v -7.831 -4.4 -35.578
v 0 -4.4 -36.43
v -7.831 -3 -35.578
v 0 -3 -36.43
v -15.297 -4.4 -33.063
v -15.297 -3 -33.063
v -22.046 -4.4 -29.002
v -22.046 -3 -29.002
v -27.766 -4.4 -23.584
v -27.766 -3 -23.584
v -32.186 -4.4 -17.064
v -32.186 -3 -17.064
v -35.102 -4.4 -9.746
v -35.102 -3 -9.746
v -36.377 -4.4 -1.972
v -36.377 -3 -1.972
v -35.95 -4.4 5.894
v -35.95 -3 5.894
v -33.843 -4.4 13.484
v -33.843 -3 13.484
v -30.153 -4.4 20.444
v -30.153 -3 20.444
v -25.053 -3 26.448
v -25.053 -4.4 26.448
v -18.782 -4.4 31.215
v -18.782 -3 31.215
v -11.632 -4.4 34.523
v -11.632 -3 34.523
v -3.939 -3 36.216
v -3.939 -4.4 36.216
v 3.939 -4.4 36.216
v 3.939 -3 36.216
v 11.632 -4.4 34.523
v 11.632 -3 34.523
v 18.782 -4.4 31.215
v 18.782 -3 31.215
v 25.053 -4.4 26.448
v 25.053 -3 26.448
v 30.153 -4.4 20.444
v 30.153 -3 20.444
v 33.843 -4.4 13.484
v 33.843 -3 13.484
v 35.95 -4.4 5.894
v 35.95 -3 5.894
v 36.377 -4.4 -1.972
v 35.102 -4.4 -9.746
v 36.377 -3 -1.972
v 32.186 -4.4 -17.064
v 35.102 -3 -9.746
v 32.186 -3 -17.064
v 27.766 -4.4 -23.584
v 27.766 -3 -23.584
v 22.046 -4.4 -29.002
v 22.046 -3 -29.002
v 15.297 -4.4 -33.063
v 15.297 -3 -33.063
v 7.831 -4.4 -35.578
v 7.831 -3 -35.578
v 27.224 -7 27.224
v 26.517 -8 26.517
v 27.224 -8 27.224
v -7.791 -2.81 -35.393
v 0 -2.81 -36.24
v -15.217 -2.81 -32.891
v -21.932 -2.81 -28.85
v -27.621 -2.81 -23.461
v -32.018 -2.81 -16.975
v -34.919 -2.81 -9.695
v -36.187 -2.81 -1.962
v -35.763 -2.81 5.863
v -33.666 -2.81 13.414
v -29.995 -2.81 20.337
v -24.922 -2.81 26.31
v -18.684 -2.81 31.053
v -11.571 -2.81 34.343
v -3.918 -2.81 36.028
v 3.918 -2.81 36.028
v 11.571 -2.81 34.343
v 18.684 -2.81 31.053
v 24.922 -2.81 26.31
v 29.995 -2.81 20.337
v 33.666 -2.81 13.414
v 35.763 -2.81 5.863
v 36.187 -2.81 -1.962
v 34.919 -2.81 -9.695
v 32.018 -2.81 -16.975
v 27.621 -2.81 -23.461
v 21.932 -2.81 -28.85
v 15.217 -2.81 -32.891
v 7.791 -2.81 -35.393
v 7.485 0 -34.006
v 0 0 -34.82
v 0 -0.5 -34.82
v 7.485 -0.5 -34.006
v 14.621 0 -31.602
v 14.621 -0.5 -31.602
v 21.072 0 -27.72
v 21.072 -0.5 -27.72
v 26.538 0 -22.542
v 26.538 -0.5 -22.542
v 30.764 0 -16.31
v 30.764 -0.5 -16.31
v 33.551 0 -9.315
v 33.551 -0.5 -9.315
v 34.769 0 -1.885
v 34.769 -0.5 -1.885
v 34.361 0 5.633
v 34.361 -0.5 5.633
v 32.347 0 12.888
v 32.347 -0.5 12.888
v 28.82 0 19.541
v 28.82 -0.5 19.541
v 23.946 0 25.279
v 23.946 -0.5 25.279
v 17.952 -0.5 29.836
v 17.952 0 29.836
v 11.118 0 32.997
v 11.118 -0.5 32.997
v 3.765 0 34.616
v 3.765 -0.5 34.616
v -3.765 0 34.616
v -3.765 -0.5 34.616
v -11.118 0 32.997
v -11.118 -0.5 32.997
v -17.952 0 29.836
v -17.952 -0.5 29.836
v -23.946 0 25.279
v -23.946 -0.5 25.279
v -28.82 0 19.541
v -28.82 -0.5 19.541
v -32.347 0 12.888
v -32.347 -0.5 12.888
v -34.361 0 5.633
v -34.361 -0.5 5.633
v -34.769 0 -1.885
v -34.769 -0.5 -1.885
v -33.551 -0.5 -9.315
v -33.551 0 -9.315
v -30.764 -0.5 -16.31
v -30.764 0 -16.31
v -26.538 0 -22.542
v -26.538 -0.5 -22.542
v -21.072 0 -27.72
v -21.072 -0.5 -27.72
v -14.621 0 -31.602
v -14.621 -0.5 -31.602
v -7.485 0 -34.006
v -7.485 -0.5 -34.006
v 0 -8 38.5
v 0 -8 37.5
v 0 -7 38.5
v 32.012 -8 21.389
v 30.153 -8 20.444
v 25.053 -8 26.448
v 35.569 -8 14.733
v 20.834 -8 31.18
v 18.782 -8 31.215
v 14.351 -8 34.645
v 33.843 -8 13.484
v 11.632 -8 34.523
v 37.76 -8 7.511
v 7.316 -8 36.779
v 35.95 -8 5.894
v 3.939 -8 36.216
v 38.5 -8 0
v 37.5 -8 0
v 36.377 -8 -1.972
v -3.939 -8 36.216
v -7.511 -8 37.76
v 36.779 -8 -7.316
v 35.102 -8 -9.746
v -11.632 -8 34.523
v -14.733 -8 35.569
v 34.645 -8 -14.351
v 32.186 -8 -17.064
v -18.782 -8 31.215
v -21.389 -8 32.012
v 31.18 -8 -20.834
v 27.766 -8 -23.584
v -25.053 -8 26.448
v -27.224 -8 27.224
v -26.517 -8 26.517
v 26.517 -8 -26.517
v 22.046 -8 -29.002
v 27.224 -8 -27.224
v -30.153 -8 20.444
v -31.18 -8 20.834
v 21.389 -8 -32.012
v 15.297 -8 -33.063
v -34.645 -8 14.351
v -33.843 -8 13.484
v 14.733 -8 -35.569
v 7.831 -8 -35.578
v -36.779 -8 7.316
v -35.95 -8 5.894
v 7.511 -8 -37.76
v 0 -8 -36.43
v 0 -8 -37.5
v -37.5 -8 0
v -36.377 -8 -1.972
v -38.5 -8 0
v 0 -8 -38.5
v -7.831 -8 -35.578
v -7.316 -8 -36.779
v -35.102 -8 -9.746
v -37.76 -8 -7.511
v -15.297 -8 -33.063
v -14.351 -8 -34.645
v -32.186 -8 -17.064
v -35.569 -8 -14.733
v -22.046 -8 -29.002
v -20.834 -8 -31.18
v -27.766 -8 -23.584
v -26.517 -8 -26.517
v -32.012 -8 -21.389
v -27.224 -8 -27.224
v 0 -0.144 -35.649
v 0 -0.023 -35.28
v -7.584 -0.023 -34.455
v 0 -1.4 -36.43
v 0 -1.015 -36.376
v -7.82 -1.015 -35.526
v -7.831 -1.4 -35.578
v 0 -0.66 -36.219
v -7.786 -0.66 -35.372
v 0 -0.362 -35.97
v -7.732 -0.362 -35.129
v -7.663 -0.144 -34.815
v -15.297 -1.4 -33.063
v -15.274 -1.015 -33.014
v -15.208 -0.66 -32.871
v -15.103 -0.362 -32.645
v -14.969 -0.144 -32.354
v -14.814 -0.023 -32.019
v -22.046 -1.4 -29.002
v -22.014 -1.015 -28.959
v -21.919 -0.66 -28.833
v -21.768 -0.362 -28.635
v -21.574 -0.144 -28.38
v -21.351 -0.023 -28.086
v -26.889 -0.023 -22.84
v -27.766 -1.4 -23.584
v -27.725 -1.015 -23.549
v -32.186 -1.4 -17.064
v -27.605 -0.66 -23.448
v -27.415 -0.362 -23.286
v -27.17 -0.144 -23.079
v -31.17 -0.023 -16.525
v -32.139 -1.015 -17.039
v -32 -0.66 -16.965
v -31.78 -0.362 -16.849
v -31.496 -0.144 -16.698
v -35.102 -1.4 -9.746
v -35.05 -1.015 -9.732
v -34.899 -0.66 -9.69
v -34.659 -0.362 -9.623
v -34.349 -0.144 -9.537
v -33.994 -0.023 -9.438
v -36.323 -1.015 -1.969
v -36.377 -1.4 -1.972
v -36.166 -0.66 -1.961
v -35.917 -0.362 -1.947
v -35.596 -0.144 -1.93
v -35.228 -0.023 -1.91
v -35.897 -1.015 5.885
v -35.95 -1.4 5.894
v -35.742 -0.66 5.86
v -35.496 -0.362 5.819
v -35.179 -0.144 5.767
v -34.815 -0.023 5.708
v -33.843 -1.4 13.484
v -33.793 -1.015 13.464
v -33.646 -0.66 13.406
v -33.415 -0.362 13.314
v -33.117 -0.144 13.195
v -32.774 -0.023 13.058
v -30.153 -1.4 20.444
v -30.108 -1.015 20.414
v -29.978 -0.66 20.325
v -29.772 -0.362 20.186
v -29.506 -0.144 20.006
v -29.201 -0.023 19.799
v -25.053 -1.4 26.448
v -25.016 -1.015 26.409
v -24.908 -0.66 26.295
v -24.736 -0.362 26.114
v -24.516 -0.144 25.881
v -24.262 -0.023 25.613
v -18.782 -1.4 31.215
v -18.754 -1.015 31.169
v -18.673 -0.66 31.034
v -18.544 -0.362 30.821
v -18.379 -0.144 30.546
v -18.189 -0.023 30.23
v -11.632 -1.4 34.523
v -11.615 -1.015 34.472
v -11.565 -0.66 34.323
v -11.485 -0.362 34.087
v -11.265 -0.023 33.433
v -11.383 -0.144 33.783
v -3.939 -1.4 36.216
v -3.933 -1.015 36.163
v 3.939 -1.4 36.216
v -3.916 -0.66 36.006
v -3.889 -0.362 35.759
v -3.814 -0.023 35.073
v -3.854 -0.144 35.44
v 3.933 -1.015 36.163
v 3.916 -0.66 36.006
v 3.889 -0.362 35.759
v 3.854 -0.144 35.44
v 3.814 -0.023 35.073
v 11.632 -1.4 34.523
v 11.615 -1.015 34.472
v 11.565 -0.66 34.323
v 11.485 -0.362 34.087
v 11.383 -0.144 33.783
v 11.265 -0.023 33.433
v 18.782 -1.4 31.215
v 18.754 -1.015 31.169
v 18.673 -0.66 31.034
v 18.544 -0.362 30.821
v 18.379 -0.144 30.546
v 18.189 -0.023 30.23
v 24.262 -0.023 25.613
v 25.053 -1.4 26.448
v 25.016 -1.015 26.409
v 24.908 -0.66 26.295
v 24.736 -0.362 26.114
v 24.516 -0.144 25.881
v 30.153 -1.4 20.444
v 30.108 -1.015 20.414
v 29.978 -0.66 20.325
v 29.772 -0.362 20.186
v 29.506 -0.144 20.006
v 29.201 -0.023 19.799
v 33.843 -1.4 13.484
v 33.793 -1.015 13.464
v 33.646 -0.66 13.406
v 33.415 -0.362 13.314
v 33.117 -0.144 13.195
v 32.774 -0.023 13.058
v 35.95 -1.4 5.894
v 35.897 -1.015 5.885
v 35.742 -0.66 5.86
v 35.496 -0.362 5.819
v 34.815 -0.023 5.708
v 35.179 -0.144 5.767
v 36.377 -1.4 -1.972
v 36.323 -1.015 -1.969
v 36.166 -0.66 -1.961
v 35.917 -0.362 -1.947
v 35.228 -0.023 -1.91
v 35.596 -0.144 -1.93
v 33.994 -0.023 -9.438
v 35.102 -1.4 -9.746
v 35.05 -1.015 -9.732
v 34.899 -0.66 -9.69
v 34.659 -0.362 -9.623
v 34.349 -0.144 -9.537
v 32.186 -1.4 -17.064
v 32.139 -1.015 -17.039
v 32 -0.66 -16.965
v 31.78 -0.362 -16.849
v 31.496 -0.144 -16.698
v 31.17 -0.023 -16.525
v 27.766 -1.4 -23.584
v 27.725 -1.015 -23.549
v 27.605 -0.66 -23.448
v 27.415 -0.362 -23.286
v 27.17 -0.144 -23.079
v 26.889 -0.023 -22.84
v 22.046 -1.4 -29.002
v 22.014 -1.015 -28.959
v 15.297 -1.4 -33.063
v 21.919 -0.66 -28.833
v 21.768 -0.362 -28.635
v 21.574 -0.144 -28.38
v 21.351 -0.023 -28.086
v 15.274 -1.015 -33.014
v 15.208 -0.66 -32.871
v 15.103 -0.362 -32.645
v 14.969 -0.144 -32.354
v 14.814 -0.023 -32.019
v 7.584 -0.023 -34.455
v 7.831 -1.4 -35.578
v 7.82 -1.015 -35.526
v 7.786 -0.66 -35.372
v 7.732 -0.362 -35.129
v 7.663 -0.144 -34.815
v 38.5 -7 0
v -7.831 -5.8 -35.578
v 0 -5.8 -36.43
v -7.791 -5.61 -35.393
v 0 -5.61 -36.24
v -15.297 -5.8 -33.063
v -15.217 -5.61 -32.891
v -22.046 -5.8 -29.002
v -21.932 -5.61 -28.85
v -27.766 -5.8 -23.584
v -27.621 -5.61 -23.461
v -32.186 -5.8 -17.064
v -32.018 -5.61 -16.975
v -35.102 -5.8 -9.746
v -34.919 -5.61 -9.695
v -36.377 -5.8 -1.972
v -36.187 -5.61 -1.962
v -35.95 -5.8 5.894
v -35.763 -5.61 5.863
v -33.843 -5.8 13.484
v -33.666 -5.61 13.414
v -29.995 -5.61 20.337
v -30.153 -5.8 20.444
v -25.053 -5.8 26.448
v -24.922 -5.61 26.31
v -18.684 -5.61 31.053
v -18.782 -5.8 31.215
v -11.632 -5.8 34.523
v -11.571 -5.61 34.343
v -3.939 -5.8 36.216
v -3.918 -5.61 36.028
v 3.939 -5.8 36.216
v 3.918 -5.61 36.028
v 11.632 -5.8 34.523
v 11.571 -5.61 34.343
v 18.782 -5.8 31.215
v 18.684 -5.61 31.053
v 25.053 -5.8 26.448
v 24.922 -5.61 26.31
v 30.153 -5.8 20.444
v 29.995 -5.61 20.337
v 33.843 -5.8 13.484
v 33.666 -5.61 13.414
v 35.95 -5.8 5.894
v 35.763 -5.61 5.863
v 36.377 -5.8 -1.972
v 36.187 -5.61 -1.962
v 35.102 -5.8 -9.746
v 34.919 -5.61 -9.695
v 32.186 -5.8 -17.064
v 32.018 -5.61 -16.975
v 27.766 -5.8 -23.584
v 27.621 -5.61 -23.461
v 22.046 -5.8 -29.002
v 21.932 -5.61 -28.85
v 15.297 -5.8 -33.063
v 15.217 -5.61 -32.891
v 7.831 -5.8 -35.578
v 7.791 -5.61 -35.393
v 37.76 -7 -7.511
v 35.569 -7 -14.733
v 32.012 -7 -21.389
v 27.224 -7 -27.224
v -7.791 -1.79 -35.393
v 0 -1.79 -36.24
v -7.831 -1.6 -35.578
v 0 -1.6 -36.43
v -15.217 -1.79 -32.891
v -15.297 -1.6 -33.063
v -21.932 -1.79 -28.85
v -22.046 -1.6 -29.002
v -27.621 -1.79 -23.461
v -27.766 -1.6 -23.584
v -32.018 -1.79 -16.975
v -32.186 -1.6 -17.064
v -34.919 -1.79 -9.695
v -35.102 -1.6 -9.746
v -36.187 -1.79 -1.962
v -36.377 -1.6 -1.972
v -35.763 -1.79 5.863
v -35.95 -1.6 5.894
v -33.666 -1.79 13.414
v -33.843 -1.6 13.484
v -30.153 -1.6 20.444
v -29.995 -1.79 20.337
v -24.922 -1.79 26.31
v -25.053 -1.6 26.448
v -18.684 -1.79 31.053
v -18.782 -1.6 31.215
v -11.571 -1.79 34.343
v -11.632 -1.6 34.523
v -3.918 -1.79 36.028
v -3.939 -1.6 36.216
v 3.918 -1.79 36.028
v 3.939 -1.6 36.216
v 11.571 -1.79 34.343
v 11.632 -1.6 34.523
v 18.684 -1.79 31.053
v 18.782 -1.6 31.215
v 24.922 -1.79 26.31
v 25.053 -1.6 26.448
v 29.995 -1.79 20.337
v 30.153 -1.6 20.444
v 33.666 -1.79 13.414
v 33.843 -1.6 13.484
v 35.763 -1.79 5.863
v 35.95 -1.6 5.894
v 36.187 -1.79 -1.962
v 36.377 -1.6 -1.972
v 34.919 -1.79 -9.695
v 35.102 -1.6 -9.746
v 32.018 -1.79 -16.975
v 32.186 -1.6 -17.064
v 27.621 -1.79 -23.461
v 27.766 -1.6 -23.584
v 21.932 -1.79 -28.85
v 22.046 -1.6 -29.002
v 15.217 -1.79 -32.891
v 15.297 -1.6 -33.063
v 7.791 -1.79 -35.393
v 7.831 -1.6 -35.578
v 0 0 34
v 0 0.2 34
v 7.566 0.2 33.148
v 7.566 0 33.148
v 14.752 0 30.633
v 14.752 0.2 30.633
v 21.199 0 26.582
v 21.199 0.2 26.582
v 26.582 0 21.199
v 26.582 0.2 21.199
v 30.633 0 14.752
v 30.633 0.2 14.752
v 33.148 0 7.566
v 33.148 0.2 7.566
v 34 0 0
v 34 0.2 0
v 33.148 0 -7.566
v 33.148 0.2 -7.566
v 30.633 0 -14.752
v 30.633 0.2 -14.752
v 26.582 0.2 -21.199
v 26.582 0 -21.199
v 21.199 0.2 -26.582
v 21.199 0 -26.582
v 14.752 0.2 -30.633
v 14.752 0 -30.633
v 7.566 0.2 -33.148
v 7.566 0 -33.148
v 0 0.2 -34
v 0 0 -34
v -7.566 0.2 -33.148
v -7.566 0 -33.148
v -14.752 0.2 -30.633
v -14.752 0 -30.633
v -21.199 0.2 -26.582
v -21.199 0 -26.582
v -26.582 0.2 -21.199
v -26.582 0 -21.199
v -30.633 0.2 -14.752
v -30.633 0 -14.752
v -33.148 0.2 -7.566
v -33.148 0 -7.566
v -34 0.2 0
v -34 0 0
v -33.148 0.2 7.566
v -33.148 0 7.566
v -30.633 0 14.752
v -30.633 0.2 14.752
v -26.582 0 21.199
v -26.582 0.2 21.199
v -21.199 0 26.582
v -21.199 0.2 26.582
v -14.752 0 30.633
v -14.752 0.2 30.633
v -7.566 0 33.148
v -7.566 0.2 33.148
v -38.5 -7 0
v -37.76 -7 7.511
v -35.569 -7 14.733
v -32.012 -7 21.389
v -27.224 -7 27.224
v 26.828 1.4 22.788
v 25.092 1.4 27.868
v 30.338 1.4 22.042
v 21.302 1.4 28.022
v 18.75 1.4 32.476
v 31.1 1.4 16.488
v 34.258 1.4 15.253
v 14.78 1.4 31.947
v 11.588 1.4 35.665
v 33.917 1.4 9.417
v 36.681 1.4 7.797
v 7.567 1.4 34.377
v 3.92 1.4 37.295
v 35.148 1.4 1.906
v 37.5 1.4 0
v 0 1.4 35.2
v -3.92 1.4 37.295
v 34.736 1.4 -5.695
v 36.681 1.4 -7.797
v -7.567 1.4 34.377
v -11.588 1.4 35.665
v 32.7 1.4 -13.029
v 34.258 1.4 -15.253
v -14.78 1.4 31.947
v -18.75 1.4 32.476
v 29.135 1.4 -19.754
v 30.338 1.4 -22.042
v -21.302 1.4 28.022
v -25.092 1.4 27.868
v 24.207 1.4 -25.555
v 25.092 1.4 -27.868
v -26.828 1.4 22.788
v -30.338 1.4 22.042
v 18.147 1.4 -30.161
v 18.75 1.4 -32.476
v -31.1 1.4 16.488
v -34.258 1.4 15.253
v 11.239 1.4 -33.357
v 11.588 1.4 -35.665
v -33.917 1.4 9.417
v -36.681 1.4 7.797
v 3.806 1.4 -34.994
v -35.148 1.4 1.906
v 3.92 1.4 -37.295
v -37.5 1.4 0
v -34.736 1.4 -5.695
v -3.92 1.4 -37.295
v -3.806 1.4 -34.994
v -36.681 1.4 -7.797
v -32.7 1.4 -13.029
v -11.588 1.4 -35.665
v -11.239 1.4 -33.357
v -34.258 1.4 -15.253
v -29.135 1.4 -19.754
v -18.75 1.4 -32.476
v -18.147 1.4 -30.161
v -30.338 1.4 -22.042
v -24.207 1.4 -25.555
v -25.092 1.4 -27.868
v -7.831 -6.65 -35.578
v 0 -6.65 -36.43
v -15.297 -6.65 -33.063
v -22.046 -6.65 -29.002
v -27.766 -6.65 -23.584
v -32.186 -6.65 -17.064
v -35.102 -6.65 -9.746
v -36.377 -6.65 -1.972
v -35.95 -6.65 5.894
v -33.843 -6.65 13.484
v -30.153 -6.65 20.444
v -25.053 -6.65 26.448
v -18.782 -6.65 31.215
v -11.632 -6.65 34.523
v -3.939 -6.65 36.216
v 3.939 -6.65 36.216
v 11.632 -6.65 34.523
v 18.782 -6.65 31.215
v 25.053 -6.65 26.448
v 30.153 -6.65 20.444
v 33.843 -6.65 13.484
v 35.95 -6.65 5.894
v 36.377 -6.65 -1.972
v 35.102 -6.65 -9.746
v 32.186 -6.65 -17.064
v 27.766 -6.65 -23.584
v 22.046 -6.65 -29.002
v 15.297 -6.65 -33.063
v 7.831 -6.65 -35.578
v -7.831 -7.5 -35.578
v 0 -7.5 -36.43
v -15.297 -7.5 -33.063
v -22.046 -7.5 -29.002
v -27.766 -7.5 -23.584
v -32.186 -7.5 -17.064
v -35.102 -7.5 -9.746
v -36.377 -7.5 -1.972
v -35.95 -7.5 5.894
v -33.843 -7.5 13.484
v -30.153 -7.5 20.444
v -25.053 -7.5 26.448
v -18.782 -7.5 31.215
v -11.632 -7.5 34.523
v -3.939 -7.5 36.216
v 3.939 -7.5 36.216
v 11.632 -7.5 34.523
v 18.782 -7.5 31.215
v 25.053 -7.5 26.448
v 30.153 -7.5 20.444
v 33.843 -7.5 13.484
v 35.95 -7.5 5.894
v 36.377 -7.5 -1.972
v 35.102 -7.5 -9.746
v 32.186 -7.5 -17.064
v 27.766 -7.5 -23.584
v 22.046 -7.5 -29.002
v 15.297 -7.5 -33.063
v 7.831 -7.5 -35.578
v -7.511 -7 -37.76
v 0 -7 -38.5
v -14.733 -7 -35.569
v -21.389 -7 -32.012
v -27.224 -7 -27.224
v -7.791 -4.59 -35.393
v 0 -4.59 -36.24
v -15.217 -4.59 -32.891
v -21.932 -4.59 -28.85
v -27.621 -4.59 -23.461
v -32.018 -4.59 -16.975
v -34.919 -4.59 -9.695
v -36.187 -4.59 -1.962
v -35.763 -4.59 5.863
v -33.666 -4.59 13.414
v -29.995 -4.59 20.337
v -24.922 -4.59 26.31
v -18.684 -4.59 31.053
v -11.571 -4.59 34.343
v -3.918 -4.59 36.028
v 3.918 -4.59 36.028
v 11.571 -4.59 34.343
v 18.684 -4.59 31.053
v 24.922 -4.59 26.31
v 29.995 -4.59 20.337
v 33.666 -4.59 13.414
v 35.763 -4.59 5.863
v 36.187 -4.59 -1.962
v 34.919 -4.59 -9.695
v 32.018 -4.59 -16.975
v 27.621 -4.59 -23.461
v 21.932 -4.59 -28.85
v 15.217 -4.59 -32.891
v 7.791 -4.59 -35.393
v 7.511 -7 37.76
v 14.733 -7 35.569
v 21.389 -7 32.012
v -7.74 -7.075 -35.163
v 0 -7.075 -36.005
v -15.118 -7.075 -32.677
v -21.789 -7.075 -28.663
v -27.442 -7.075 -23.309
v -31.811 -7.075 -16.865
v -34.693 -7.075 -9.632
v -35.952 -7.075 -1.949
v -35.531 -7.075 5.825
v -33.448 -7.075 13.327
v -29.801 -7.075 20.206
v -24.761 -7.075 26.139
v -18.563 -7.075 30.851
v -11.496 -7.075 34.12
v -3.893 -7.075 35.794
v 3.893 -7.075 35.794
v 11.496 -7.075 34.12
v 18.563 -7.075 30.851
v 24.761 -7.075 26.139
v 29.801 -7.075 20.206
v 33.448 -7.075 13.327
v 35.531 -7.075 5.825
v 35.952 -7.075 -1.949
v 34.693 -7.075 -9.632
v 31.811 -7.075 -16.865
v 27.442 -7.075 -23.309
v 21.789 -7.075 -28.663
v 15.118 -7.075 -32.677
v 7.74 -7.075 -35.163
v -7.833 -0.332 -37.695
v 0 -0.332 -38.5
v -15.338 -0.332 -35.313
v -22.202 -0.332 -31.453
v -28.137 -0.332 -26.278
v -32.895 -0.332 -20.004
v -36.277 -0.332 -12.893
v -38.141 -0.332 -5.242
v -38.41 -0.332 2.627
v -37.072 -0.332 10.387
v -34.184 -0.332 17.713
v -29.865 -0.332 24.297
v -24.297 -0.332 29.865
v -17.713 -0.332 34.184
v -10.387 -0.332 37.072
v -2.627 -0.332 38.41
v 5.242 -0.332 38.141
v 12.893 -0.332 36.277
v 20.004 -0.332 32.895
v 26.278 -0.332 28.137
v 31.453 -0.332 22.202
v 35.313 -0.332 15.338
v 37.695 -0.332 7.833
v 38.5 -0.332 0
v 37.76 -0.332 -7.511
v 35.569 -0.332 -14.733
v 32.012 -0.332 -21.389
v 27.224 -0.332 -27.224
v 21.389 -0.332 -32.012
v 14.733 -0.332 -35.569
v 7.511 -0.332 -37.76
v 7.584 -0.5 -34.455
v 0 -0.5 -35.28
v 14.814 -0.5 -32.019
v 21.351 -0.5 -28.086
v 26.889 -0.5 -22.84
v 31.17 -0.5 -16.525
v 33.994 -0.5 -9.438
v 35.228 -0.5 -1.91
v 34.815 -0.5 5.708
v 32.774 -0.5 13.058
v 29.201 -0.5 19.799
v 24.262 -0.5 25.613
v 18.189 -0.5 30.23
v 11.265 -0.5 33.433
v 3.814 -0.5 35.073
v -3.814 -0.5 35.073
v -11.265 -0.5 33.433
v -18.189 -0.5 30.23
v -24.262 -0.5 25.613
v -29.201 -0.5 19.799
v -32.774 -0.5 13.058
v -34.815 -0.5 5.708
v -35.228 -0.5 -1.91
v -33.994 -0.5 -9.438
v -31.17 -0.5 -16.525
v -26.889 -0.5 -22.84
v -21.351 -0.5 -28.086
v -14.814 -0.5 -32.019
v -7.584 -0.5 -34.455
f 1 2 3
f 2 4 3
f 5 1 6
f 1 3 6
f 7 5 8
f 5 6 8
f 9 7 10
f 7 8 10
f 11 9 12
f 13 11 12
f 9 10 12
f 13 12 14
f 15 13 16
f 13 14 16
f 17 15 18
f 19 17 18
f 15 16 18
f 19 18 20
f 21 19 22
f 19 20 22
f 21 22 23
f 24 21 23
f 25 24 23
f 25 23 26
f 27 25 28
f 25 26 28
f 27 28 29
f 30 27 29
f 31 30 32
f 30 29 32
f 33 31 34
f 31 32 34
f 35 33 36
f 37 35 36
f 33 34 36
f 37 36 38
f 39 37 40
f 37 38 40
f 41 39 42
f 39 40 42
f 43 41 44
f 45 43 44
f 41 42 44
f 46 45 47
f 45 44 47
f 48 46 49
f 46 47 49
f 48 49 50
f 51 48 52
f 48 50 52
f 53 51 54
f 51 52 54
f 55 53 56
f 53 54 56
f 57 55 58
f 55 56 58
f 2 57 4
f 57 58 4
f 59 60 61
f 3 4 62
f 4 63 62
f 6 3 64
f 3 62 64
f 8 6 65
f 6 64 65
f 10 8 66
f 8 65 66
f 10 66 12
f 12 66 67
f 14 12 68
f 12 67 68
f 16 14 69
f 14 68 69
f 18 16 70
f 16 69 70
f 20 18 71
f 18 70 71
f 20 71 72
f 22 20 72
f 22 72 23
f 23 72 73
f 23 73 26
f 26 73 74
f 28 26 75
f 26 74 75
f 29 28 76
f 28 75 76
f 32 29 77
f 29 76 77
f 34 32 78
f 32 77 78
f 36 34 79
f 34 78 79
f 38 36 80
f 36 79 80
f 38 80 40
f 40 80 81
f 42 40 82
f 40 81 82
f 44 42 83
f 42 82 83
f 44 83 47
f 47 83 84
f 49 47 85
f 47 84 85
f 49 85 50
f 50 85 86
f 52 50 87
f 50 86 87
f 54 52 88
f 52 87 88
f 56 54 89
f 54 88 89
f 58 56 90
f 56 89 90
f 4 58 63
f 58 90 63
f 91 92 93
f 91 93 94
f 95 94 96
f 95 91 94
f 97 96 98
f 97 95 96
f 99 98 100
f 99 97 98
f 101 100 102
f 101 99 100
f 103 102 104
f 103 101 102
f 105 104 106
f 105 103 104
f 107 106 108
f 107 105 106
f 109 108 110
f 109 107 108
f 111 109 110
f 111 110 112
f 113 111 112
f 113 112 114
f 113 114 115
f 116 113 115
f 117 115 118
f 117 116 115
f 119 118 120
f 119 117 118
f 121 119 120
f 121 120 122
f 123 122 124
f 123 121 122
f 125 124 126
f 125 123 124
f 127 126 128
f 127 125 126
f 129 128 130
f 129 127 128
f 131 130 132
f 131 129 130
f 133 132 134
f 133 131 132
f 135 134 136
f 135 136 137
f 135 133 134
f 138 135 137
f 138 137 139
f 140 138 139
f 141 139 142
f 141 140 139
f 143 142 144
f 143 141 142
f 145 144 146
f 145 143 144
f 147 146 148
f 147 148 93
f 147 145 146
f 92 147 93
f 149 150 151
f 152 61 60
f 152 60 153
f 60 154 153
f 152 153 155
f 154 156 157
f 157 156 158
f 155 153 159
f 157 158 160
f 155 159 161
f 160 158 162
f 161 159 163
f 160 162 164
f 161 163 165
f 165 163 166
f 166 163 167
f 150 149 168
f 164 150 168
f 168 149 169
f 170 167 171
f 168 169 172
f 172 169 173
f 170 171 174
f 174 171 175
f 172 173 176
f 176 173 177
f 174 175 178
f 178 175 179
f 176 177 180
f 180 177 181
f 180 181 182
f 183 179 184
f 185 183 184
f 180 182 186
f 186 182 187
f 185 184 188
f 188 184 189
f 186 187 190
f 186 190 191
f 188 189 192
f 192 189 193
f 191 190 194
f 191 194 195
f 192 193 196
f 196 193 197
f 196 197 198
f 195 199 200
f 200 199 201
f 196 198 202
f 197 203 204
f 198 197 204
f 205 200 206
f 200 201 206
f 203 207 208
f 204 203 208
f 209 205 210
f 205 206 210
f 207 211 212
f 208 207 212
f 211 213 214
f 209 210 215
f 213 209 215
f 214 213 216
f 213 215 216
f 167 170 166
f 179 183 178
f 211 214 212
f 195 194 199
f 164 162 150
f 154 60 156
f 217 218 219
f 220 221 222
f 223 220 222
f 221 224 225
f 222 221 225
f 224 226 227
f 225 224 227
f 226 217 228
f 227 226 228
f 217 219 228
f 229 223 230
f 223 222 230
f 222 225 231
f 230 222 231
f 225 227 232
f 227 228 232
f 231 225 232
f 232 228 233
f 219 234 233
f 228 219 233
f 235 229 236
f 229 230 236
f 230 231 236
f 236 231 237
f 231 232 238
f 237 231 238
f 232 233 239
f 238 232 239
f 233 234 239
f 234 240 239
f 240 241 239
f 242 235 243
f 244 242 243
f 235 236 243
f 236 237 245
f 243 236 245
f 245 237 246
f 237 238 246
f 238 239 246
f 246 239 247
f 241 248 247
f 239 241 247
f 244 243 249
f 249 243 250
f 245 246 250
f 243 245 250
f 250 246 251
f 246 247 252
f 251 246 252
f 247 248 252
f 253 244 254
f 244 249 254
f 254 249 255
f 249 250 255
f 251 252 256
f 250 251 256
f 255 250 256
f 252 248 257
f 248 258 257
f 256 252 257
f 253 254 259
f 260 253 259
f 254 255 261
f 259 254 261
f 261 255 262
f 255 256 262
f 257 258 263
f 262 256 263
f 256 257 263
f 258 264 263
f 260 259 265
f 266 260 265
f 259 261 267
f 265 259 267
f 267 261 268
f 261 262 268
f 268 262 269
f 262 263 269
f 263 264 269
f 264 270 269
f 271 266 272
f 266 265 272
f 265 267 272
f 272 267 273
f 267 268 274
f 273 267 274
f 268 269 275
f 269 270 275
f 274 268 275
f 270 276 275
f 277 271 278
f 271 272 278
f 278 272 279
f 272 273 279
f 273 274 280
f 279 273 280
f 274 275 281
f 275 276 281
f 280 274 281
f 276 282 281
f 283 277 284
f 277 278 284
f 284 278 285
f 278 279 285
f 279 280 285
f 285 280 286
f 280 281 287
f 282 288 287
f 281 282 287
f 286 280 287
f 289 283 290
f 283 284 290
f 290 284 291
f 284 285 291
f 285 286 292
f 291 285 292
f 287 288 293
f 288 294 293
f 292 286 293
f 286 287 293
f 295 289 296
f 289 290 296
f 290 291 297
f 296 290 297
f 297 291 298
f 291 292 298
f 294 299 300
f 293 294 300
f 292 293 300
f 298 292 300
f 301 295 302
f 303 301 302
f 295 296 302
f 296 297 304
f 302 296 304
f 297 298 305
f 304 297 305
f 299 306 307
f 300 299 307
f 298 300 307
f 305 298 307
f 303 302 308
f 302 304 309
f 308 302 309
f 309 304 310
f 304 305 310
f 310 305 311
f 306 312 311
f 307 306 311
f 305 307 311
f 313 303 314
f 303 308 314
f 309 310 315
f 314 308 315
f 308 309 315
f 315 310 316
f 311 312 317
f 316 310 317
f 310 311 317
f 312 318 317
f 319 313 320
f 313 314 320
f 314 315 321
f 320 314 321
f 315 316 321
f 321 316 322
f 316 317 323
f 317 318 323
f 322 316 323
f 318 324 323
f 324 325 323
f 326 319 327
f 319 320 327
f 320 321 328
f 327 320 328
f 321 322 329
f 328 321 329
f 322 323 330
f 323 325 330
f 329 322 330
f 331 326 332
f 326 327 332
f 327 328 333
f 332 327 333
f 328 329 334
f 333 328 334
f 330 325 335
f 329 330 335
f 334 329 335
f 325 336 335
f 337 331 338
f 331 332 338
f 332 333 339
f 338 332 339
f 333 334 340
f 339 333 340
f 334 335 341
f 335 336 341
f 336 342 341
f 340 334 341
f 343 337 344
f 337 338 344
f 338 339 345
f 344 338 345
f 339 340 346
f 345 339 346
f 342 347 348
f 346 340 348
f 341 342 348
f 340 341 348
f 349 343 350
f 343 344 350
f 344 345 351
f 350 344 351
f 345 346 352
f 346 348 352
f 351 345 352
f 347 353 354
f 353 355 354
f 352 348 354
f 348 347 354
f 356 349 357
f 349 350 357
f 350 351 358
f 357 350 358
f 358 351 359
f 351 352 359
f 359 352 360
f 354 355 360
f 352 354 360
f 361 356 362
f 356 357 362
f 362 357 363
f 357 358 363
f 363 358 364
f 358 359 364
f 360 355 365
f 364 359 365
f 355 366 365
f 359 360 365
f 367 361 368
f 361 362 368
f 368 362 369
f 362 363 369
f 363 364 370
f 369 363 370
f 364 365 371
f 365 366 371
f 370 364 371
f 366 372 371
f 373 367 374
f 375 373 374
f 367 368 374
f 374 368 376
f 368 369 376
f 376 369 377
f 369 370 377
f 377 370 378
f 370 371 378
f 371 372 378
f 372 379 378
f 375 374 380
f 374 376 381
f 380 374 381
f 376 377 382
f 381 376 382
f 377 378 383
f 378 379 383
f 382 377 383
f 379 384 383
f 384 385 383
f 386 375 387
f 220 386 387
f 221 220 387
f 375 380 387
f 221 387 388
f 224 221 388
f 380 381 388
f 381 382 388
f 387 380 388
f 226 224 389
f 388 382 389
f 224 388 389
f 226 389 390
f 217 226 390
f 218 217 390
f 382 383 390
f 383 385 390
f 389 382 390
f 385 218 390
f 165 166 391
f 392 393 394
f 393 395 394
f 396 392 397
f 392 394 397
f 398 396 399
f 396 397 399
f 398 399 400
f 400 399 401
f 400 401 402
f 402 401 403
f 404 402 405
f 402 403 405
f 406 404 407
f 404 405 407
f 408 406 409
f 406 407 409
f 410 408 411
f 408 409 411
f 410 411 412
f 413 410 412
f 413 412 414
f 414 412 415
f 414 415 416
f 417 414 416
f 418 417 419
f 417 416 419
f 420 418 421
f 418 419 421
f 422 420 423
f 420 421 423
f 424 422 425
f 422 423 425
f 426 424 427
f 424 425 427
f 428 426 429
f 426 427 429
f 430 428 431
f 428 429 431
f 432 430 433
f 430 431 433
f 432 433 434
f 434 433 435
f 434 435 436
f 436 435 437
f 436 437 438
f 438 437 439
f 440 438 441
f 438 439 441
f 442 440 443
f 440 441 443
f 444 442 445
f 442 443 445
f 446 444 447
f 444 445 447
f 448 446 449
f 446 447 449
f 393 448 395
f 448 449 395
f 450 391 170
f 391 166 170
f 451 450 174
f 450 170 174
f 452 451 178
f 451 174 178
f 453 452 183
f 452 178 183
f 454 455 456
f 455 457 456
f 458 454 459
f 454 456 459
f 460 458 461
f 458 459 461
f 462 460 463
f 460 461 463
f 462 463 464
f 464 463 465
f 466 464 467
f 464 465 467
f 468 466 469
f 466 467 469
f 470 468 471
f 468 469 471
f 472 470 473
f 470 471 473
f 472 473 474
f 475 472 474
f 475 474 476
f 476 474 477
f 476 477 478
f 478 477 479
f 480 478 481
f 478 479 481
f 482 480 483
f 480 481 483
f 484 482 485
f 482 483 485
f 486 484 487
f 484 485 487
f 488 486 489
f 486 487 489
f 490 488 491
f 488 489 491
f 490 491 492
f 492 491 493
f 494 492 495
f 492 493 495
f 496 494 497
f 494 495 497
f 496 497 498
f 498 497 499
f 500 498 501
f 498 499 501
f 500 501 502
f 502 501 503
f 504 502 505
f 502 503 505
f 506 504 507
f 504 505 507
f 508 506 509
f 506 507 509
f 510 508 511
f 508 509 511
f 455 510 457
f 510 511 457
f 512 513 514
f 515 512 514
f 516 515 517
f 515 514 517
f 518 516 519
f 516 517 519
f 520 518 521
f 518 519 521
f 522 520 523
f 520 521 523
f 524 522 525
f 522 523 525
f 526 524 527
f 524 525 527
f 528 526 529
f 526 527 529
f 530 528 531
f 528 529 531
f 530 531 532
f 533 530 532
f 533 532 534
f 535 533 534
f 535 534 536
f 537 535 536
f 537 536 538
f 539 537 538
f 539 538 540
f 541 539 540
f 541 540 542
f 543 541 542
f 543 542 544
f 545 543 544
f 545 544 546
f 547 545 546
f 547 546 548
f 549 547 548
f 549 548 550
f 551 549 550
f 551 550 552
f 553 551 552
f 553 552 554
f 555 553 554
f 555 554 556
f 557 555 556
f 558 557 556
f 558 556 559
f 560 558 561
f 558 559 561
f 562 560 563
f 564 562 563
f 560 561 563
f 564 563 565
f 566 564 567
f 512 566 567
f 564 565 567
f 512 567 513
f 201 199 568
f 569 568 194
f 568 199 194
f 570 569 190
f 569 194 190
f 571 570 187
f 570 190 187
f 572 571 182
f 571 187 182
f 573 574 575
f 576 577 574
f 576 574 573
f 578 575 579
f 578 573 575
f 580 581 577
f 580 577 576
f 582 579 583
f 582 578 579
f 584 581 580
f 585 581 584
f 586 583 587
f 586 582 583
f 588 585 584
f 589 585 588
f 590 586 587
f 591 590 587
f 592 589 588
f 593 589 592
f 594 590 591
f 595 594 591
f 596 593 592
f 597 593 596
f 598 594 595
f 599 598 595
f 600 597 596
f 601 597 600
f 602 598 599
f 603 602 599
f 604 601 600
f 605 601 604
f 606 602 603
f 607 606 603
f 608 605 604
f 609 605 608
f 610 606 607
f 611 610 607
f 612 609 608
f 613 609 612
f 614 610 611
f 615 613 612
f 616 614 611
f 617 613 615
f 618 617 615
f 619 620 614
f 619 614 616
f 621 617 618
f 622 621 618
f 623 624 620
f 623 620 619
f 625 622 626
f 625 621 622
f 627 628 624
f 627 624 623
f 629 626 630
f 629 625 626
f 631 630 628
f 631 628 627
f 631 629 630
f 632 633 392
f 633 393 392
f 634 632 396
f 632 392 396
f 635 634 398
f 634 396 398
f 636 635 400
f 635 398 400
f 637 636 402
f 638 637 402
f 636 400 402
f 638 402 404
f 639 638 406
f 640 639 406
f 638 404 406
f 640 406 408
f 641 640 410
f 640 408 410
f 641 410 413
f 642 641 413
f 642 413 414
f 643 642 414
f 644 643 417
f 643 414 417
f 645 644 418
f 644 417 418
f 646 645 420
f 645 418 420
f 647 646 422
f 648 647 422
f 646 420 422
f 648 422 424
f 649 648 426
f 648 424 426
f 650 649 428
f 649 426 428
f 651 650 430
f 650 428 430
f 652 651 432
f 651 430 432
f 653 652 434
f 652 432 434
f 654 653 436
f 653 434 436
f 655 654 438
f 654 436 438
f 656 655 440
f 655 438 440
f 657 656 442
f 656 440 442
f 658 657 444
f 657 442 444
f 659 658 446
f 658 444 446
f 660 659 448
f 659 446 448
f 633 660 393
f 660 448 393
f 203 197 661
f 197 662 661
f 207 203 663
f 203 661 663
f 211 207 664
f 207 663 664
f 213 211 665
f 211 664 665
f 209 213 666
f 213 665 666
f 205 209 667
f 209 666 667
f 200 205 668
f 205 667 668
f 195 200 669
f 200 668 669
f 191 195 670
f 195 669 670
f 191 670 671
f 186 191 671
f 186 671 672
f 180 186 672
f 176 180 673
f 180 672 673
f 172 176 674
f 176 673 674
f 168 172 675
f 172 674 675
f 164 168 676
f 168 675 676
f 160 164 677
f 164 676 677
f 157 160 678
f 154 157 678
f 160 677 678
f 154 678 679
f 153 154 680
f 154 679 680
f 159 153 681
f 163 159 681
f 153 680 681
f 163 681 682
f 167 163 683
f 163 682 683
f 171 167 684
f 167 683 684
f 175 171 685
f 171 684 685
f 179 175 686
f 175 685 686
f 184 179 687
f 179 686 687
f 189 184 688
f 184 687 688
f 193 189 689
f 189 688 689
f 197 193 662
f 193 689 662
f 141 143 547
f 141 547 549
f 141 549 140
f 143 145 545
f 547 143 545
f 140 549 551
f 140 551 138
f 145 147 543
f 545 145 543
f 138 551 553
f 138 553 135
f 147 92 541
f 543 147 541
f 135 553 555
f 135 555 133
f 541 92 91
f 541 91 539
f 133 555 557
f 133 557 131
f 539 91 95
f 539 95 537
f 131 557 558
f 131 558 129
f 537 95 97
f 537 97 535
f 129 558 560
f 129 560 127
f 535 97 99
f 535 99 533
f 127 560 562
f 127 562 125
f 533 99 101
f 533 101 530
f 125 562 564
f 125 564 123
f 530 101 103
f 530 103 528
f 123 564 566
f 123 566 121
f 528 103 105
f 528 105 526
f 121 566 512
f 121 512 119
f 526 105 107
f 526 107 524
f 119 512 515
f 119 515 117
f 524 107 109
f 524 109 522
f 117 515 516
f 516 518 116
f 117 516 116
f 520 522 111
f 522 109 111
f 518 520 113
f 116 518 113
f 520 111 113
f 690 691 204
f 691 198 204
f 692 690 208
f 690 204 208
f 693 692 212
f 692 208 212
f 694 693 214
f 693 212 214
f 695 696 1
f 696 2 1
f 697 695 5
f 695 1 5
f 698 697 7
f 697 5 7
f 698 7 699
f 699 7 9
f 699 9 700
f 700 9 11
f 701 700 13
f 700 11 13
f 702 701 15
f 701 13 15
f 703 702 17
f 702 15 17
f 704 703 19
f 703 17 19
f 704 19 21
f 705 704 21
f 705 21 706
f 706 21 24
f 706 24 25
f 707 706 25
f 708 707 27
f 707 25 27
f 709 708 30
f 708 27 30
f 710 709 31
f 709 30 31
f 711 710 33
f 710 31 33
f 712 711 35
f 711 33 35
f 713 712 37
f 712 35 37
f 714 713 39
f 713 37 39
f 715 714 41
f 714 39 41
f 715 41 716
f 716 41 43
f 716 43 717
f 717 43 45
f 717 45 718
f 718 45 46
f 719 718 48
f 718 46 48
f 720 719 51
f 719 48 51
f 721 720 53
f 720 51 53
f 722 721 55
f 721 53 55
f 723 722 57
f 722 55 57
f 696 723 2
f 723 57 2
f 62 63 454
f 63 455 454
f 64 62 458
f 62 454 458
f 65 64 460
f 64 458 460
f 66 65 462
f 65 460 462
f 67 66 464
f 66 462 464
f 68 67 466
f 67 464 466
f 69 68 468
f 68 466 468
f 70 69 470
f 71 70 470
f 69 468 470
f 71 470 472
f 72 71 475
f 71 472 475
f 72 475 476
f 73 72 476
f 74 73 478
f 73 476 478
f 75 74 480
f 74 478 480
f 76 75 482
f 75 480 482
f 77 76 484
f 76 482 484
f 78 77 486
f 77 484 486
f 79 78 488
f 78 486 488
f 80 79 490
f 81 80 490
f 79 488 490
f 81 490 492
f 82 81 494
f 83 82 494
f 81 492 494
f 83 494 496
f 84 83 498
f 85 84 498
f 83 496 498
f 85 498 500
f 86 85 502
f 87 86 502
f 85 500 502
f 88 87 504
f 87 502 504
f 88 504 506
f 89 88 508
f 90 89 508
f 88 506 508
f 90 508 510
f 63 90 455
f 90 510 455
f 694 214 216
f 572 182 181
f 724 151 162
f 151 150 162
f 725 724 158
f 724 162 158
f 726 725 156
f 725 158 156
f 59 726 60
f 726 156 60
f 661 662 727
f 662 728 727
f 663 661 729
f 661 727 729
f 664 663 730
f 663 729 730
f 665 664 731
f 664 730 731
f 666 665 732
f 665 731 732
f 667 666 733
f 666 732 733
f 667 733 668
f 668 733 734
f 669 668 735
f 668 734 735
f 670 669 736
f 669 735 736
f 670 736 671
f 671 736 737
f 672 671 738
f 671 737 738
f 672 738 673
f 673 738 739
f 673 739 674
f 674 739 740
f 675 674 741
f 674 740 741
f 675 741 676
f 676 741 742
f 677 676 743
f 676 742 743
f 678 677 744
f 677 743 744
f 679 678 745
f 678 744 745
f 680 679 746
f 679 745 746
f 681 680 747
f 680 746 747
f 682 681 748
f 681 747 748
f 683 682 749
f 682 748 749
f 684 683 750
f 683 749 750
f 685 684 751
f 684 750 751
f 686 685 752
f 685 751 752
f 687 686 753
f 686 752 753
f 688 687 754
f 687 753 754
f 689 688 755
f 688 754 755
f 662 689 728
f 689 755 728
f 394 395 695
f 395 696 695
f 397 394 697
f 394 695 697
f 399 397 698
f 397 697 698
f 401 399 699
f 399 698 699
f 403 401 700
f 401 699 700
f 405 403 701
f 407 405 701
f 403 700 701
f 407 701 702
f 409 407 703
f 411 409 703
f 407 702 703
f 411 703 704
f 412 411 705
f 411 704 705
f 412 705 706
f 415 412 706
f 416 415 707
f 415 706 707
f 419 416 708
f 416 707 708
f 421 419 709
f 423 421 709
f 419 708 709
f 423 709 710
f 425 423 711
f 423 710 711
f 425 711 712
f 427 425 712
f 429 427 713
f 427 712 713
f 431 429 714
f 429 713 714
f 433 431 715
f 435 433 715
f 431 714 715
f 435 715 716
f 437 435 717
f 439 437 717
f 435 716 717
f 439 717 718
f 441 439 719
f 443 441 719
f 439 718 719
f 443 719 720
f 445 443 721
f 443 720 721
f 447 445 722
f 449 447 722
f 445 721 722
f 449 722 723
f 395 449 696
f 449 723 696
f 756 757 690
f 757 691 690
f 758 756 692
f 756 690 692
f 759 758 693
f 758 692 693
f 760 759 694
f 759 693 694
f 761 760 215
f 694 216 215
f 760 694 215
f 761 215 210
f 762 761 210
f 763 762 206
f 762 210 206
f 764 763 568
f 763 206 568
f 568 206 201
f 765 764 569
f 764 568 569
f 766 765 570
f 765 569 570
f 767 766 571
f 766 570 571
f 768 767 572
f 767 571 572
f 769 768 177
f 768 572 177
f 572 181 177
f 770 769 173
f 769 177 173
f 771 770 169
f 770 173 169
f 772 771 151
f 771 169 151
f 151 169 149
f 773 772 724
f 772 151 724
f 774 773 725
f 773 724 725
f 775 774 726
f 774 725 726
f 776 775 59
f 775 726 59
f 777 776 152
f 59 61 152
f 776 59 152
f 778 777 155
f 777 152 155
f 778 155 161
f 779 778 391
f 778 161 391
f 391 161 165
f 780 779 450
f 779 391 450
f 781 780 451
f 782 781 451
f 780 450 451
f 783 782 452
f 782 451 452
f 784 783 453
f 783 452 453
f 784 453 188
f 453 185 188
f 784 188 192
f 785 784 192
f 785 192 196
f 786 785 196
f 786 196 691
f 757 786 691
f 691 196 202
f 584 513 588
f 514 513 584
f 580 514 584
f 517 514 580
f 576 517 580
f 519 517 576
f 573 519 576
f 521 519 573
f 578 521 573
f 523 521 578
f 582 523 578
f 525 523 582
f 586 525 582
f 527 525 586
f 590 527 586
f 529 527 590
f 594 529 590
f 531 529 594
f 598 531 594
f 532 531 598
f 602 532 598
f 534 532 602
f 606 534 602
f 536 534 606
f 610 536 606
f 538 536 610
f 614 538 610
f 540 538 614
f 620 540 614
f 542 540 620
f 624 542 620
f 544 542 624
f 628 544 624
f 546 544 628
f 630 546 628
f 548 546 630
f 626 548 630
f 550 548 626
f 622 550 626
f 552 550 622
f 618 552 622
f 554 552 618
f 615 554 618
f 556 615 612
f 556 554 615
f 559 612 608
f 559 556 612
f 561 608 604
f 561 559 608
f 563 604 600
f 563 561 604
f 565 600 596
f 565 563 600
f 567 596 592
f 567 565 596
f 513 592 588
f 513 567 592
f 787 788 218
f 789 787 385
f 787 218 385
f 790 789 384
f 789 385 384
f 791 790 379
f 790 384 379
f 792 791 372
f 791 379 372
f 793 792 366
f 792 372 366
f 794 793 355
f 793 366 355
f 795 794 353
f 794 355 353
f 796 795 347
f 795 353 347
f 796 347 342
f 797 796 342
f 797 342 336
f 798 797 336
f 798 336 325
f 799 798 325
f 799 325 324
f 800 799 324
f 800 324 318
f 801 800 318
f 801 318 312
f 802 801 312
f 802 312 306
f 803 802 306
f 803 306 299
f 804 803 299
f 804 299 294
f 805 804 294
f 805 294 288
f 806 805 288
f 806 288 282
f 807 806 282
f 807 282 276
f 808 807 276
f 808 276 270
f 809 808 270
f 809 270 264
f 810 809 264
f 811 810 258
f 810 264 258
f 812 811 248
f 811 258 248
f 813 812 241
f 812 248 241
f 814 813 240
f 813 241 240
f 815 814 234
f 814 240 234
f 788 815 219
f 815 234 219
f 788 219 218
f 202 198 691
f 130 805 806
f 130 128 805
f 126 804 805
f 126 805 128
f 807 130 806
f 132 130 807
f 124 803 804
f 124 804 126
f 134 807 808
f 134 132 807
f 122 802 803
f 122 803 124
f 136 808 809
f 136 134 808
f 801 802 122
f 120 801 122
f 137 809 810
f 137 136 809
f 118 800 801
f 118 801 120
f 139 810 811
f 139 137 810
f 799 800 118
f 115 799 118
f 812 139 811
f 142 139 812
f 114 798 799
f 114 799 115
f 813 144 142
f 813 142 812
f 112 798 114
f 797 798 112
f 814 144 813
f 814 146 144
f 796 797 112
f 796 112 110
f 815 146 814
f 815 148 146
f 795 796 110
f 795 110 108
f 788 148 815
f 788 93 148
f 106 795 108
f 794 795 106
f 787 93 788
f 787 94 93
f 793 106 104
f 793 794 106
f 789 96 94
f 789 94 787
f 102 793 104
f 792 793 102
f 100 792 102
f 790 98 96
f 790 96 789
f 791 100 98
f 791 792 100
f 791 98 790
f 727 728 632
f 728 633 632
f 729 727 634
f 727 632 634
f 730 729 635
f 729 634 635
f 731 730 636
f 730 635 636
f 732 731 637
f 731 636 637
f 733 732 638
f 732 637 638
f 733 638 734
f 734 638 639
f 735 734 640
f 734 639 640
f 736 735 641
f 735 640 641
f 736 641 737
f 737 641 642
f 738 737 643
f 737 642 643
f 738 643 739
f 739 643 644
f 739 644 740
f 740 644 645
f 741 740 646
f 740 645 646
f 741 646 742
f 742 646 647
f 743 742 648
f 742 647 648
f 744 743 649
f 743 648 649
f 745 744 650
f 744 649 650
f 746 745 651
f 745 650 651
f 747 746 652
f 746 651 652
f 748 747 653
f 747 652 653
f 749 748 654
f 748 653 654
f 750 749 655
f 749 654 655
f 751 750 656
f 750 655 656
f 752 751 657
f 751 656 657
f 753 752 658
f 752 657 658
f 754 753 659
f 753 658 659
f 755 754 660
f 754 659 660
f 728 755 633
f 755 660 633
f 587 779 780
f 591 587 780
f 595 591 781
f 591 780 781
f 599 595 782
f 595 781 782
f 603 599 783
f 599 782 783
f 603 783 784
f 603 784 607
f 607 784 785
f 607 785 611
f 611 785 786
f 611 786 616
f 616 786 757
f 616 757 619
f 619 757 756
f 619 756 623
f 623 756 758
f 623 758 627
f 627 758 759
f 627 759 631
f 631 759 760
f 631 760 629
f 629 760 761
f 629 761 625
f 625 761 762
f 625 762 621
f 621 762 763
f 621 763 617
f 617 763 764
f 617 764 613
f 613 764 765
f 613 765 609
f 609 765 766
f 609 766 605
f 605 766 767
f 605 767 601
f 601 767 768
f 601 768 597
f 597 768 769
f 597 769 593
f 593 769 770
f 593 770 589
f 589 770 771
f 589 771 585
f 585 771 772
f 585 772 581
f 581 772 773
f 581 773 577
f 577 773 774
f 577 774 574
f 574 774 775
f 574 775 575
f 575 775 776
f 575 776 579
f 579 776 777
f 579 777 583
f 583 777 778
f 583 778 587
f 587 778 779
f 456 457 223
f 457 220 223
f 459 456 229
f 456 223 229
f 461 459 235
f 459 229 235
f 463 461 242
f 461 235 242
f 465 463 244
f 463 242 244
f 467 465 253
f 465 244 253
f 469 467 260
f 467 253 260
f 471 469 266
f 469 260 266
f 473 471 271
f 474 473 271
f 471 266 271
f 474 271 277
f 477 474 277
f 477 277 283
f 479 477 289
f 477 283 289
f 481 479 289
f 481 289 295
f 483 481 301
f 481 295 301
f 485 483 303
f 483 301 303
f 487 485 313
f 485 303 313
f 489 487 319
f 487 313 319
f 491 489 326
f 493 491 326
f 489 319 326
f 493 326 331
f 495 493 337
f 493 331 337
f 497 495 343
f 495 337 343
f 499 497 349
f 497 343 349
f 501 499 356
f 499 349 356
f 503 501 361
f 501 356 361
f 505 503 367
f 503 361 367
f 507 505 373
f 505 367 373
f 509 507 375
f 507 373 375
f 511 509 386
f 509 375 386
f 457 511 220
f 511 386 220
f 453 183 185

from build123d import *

# Parameters (mm, degrees)
SKETCH_1_R               = 38.5
EXTRUDE_1_DEPTH          = 2
SKETCH_3_R               = 34
CUT_EXTRUDE_1_DEPTH      = 56.357926262
CUT_EXTRUDE_START        = -0.6
SKETCH_4_R               = 38.5
CUT_EXTRUDE_2_DEPTH      = 0.6
CHAMFER_2_SIZE           = 1.2
CUT_REVOLVE_1_ANGLE      = 45
PATTERN_CIRCULAR_1_COUNT = 4
SKETCH_6_R               = 35.28
SKETCH_6_R_2             = 34.82
EXTRUDE_2_DEPTH          = 0.5


with BuildPart() as part:
    # 草图1 → 凸台-拉伸1 (new body)
    with BuildSketch(Plane(origin=(0, 0, 0), x_dir=(1, 0, 0), z_dir=(0, 1, 0))):
        with Locations(Location((0, 0, 0), (0, 0, 270))):
            Circle(SKETCH_1_R)
    extrude(amount=EXTRUDE_1_DEPTH)

    # 草图2 → 旋转1 (revolve)
    with BuildSketch(Plane(origin=(0, 0, 0), x_dir=(0.9335804264972116, 0, -0.3583679495452748), z_dir=(0.3583679495452748, 0, 0.9335804264972116)), mode=Mode.PRIVATE) as revolve_1_sk:
        with BuildLine():
            Line((36.43, -8), (36.43, -7.5))
            Line((36.43, -7.5), (36.005, -7.075))
            Line((36.005, -7.075), (36.43, -6.65))
            Line((36.43, -6.65), (36.43, -5.8))
            Line((36.43, -5.8), (36.24, -5.61))
            Line((36.24, -5.61), (36.24, -4.59))
            Line((36.24, -4.59), (36.43, -4.4))
            Line((36.43, -4.4), (36.43, -3))
            Line((36.43, -3), (36.24, -2.81))
            Line((36.24, -2.81), (36.24, -1.79))
            Line((36.24, -1.79), (36.43, -1.6))
            Line((36.43, -1.6), (36.43, -1.4))
            ThreePointArc((36.43, -1.4), (36.019949494, -0.410050506), (35.03, 0))
            Line((35.03, 0), (38.5, 0))
            Line((38.5, 0), (38.5, -8))
            Line((38.5, -8), (36.43, -8))
        make_face()
    revolve(revolve_1_sk.sketch.rotate(Axis((0, 0, 0), (0, 1, 0)), 69), axis=Axis((0, 0, 0), (0, 1, 0)))

    # 草图3 → 切除-拉伸1 (cut, through all)
    with BuildSketch(Plane(origin=(0, 2, 0), x_dir=(1, 0, 0), z_dir=(0, 1, 0))):
        with Locations(Location((0, 0, 0), (0, 0, 270))):
            Circle(SKETCH_3_R)
    extrude(amount=-CUT_EXTRUDE_1_DEPTH, mode=Mode.SUBTRACT)

    # 草图4 → 切除-拉伸2 (cut)
    with BuildSketch(Plane(origin=(0, 2, 0), x_dir=(1, 0, 0), z_dir=(0, 1, 0)).offset(CUT_EXTRUDE_START)):
        with Locations(Location((0, 0, 0), (0, 0, 90))):
            Circle(SKETCH_4_R)
    extrude(amount=CUT_EXTRUDE_2_DEPTH, mode=Mode.SUBTRACT)

    # 倒角1: read off the stored shape, not the designer's step
    # 倒角1 outline → 倒角1 (revolve, cut)
    with BuildSketch(Plane.XY):
        Polygon((38.5, 1.4), (37.500029334, 1.4), (38.5, -0.332), align=None)
    revolve(axis=Axis((0, 0, 0), (0, 1, 0)), mode=Mode.SUBTRACT)

    # 倒角2
    chamfer_2_edges = [part.edges().sort_by_distance(p)[0] for p in [
        (0, 1.4, -34),
    ]]
    chamfer(chamfer_2_edges, length=CHAMFER_2_SIZE)

    # 草图5 → 切除-旋转1 (revolve, cut)
    with BuildSketch(Plane.XY):
        Polygon((38.5, -8), (38.5, -7), (37.5, -8), align=None)
    cut_revolve_1 = revolve(axis=Axis((0, 0, 0), (0, 1, 0)), revolution_arc=CUT_REVOLVE_1_ANGLE, mode=Mode.SUBTRACT)

    # 阵列(圆周)1: 切除-旋转1 ×4 about axis
    pattern_circular_1_axis = Axis((0, 0, 0), (0, 1, 0))
    for i in range(1, PATTERN_CIRCULAR_1_COUNT):
        add(cut_revolve_1.rotate(pattern_circular_1_axis, i * 360 / PATTERN_CIRCULAR_1_COUNT), mode=Mode.SUBTRACT)

    # 草图6 → 凸台-拉伸2 (add)
    with BuildSketch(Plane.XZ):
        with Locations(Location((0, 0, 0), (0, 0, 270))):
            Circle(SKETCH_6_R)
        with Locations(Location((0, 0, 0), (0, 0, 270))):
            Circle(SKETCH_6_R_2, mode=Mode.SUBTRACT)
    extrude(amount=EXTRUDE_2_DEPTH)


solid = part.part
